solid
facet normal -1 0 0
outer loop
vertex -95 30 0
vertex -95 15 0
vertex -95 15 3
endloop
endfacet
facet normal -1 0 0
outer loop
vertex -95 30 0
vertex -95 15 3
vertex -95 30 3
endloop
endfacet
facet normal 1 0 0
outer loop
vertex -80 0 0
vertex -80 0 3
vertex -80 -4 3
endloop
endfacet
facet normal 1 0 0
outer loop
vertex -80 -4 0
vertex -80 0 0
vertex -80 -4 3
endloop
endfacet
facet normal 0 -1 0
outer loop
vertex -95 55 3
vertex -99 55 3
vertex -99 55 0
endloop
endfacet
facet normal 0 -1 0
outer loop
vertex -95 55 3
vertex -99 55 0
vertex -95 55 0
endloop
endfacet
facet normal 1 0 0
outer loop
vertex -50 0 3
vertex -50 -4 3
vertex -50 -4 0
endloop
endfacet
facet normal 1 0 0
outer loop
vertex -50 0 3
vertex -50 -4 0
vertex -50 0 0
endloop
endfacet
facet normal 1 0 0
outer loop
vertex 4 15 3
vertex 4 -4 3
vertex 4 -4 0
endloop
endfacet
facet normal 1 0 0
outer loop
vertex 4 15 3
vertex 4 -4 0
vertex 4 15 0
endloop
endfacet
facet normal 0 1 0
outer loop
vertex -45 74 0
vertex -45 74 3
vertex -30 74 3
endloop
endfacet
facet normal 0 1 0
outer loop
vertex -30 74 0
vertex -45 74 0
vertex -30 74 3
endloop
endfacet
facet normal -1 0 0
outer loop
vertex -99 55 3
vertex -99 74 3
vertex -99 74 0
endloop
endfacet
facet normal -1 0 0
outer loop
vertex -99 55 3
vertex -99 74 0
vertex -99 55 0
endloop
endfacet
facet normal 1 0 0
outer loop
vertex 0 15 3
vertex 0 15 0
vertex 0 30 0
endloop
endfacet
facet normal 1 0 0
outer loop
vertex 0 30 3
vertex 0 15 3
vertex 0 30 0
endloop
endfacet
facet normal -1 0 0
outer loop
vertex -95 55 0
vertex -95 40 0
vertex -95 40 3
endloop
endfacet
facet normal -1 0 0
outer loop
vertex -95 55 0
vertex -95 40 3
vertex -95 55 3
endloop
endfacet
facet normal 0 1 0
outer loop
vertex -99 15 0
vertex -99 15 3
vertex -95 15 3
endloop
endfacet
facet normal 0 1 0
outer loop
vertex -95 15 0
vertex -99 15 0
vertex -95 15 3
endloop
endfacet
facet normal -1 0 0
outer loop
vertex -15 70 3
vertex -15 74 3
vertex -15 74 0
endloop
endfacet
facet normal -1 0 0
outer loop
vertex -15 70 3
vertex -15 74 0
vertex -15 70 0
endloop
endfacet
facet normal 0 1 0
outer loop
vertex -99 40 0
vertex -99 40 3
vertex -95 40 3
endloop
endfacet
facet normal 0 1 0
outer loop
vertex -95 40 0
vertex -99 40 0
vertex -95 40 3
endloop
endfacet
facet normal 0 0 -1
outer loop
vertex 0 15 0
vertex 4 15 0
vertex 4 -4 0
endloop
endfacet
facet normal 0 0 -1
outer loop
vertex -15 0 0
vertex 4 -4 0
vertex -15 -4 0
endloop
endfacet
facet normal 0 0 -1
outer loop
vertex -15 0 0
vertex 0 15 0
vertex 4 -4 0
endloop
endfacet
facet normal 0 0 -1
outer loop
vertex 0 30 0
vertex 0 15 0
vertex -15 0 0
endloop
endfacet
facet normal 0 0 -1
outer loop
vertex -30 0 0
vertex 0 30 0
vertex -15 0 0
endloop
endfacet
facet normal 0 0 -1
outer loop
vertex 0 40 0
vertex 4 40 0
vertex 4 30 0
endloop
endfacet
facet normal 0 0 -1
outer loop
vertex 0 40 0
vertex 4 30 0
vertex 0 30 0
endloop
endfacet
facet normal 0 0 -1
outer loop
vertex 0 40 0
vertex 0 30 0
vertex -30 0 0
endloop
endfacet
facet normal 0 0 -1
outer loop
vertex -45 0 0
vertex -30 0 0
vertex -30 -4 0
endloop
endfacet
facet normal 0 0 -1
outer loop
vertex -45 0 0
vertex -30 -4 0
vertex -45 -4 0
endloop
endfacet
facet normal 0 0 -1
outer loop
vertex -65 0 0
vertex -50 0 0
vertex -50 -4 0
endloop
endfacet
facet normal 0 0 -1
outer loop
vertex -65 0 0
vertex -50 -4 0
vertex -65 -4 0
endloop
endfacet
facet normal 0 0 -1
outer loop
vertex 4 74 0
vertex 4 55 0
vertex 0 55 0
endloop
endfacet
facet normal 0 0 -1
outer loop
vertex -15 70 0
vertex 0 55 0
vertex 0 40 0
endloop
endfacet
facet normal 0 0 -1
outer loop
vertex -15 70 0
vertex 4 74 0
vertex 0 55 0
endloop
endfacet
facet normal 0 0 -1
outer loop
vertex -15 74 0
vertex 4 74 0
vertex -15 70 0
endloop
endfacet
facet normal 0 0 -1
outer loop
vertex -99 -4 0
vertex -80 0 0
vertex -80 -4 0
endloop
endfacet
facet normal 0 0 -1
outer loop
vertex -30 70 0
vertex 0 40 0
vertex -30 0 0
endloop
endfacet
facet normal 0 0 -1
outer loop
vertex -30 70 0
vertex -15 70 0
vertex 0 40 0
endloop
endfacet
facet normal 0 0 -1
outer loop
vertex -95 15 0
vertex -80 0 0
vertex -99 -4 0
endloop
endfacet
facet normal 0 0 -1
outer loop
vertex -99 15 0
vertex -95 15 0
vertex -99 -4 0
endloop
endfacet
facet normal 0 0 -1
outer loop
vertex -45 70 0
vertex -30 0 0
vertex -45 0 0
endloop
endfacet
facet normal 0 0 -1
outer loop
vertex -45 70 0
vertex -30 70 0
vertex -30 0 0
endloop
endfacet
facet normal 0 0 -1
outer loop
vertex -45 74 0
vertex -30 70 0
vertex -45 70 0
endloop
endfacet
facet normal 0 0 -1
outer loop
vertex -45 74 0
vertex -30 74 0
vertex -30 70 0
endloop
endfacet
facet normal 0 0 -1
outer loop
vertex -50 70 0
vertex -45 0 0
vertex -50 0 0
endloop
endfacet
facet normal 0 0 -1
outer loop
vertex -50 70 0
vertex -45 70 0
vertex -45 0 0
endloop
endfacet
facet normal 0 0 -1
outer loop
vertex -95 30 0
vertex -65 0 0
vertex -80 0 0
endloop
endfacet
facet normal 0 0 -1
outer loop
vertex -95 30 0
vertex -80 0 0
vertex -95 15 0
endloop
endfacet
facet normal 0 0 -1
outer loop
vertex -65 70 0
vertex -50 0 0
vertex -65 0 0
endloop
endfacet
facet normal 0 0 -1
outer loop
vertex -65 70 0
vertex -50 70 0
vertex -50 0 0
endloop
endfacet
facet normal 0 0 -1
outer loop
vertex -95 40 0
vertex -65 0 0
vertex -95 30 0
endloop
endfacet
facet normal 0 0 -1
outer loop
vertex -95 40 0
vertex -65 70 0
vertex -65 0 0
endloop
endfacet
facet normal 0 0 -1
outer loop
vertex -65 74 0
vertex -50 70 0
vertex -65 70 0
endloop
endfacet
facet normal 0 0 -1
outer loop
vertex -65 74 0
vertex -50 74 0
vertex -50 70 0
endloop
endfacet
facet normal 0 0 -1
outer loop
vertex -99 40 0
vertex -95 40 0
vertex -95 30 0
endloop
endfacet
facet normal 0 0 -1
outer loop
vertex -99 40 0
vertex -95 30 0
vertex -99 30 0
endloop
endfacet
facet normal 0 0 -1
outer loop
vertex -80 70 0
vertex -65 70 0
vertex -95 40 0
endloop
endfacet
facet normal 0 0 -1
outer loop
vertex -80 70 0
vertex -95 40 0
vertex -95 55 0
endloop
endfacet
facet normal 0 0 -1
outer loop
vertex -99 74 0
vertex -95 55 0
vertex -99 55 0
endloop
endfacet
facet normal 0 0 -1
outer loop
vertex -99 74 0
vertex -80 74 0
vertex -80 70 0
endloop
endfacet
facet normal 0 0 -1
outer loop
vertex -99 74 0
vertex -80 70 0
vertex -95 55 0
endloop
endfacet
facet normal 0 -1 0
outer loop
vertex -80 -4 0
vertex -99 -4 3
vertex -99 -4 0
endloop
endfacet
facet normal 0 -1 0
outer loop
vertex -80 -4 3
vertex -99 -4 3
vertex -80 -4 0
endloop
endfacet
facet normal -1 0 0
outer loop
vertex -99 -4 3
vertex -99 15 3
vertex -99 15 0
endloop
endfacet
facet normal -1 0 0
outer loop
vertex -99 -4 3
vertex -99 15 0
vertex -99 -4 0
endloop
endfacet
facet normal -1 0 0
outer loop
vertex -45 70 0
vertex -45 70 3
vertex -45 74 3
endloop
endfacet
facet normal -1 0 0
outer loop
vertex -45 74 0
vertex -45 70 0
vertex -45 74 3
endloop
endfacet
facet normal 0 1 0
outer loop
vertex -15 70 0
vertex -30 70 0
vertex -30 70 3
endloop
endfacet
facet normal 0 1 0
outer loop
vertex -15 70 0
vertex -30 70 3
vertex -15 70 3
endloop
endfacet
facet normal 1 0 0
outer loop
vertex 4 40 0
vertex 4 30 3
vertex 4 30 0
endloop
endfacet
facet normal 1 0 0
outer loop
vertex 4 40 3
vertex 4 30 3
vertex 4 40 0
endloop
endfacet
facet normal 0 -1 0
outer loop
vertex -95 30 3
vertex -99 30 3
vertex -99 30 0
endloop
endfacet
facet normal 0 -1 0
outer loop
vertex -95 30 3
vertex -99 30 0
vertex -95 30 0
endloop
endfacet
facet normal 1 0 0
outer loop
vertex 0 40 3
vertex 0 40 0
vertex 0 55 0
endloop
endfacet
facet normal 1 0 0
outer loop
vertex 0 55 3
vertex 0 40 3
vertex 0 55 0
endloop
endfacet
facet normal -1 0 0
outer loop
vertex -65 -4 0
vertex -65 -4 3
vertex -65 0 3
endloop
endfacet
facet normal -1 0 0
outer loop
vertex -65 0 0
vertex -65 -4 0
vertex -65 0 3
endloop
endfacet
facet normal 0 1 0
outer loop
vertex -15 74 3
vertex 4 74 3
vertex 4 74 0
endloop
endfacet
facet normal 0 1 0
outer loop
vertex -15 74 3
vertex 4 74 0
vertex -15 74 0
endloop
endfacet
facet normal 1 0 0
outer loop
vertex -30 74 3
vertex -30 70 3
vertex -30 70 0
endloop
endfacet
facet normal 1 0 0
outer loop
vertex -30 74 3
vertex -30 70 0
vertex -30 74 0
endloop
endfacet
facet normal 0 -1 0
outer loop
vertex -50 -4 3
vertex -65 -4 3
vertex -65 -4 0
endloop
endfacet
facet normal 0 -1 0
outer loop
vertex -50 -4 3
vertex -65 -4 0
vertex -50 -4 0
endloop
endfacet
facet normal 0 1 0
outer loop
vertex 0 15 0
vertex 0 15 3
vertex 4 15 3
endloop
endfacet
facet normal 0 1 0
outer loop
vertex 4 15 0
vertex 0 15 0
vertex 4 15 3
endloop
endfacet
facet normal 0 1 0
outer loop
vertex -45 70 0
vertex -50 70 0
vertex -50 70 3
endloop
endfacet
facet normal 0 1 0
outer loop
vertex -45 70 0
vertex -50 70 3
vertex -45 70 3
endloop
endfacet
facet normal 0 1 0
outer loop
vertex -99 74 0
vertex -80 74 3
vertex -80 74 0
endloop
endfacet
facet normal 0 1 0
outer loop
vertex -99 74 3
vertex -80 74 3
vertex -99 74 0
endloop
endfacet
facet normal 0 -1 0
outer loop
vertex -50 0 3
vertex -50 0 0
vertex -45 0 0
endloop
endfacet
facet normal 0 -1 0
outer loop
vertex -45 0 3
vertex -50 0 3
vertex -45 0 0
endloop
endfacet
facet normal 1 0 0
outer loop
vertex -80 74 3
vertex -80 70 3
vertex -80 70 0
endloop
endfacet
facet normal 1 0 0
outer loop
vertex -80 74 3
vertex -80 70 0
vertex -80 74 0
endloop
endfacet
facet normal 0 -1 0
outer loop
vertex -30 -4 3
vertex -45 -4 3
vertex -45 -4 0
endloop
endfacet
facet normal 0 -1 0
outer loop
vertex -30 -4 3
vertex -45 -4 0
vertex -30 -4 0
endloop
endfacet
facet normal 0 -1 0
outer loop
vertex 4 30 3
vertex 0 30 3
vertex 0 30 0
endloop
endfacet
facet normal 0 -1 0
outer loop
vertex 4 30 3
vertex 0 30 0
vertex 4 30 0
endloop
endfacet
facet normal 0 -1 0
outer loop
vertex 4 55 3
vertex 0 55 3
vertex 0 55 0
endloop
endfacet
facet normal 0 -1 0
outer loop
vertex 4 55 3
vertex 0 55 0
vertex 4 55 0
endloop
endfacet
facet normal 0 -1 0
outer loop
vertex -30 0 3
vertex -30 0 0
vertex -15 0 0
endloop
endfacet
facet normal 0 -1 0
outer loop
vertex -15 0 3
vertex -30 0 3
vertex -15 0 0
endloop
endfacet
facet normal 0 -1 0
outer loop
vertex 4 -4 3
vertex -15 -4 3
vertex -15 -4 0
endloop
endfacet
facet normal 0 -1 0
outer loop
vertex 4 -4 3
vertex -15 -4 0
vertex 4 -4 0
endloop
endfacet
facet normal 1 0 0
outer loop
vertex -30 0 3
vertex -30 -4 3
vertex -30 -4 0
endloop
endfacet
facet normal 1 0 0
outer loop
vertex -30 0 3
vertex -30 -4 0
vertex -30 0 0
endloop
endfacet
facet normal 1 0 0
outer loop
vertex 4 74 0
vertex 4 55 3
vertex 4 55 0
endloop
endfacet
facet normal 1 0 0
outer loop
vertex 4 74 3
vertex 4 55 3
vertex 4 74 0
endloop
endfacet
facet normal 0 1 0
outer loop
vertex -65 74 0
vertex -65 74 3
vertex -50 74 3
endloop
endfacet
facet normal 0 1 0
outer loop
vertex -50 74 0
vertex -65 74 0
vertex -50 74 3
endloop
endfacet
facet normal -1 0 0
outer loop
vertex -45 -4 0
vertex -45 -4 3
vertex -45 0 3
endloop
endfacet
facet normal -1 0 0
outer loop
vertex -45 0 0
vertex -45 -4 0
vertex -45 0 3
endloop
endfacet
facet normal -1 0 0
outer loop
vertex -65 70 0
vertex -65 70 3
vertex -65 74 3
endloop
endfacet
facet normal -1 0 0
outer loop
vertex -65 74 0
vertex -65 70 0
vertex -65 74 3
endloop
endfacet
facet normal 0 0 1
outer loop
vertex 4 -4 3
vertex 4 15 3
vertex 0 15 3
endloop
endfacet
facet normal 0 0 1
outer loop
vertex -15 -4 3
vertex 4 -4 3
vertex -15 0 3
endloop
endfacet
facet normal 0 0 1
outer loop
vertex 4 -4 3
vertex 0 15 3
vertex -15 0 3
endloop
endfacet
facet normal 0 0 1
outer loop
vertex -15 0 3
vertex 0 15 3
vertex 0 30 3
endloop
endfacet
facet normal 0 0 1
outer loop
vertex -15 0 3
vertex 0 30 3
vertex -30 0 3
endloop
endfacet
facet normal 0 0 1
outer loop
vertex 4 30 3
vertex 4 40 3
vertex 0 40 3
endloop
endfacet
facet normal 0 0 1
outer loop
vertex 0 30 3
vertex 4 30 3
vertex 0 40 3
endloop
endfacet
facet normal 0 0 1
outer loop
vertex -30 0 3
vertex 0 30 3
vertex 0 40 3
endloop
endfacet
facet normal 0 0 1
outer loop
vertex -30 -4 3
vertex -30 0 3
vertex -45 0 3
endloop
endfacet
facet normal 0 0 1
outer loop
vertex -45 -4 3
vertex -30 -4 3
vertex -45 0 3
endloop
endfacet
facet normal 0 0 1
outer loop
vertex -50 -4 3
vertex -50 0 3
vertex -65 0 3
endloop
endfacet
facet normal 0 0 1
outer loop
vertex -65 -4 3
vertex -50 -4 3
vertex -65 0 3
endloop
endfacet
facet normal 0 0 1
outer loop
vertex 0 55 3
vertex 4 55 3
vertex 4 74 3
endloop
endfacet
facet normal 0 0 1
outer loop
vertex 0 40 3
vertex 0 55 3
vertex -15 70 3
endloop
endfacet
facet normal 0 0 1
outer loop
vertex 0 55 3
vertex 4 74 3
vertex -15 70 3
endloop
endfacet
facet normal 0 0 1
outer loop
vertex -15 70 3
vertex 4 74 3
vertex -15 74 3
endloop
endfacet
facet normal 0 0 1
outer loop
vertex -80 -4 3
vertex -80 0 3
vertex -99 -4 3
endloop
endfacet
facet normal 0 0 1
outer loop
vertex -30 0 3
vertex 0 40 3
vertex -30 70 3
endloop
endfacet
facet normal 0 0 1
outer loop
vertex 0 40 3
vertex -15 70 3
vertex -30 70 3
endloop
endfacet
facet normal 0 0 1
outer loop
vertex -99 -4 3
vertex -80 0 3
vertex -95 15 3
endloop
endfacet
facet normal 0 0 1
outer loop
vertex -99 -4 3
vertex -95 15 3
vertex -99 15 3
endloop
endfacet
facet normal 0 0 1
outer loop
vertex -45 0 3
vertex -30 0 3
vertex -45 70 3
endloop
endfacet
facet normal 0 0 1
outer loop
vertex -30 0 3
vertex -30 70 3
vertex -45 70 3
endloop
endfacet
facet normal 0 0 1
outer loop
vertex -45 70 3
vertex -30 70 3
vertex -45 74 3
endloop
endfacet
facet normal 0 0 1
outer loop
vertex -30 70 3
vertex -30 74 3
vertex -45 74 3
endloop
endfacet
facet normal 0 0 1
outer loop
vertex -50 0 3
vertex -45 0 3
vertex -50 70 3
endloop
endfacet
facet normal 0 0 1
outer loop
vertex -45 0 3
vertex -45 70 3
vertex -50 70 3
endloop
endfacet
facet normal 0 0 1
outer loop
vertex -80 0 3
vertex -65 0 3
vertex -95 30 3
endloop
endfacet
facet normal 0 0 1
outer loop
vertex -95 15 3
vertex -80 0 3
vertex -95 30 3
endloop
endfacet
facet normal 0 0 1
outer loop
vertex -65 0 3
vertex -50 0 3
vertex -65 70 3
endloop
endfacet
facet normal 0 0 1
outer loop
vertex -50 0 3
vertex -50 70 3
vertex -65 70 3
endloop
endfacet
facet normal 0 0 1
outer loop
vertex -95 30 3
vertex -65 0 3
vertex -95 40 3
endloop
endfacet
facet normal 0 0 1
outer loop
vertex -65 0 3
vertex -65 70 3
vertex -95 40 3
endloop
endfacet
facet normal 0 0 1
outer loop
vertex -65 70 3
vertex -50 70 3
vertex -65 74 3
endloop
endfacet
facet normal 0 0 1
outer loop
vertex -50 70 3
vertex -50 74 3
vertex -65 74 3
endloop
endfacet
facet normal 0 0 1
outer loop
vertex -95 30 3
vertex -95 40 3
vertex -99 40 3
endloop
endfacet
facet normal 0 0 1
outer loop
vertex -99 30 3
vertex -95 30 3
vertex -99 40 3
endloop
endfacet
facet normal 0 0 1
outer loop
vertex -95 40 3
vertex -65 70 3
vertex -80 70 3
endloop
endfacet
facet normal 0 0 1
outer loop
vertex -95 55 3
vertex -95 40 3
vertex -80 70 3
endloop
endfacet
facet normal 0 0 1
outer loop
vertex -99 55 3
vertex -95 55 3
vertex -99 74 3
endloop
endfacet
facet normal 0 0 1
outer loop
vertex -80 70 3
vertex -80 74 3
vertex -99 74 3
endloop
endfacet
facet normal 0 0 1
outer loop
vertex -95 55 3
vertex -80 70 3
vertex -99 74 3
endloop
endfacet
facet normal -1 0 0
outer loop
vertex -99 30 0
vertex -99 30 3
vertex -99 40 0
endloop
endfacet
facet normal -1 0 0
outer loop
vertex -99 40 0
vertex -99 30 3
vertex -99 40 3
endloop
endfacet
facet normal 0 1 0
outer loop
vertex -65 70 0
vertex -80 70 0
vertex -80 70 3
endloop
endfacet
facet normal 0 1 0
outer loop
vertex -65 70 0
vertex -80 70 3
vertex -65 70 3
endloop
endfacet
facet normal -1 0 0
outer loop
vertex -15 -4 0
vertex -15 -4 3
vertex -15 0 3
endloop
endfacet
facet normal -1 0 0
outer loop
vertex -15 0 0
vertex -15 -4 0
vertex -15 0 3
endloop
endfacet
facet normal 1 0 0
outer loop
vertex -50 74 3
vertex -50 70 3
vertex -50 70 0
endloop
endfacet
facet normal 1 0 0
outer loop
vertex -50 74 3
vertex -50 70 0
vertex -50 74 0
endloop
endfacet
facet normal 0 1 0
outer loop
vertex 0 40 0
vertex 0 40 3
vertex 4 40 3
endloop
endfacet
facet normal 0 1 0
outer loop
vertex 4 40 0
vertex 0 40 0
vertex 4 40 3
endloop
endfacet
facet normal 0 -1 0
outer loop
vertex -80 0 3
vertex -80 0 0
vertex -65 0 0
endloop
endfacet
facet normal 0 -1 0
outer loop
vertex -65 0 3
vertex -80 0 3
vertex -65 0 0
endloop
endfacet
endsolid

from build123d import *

# Parameters (mm, degrees)
SKETCH1_W           = 95
SKETCH1_H           = 70
BOSS_EXTRUDE1_DEPTH = 3
SKETCH2_W           = 4
SKETCH2_H           = 10
SKETCH2_W_2         = 15
SKETCH2_H_2         = 4
BOSS_EXTRUDE2_DEPTH = 3


with BuildPart() as part:
    # Sketch1 → Boss-Extrude1 (new body)
    with BuildSketch(Plane.XY):
        with Locations((-47.5, 35)):
            Rectangle(SKETCH1_W, SKETCH1_H)
    extrude(amount=BOSS_EXTRUDE1_DEPTH)

    # Sketch2 → Boss-Extrude2 (add)
    with BuildSketch(Plane.XY.offset(3)):
        Polygon((0, 15), (4, 15), (4, 0), (4, -4), (0, -4), (-15, -4), (-15, 0), (0, 0), align=None)
        with Locations((2, 35)):
            Rectangle(SKETCH2_W, SKETCH2_H)
        Polygon((-95, 70), (-80, 70), (-80, 74), (-95, 74), (-99, 74), (-99, 70), (-99, 55), (-95, 55), align=None)
        Polygon((0, 74), (-15, 74), (-15, 70), (0, 70), (0, 55), (4, 55), (4, 70), (4, 74), align=None)
        with Locations((-57.5, 72)):
            Rectangle(SKETCH2_W_2, SKETCH2_H_2)
        with Locations((-37.5, 72)):
            Rectangle(SKETCH2_W_2, SKETCH2_H_2)
        with Locations((-37.5, -2)):
            Rectangle(SKETCH2_W_2, SKETCH2_H_2)
        with Locations((-57.5, -2)):
            Rectangle(SKETCH2_W_2, SKETCH2_H_2)
        Polygon((-80, -4), (-95, -4), (-99, -4), (-99, 0), (-99, 15), (-95, 15), (-95, 0), (-80, 0), align=None)
        with Locations((-97, 35)):
            Rectangle(SKETCH2_W, SKETCH2_H)
    extrude(amount=-BOSS_EXTRUDE2_DEPTH)


solid = part.part
